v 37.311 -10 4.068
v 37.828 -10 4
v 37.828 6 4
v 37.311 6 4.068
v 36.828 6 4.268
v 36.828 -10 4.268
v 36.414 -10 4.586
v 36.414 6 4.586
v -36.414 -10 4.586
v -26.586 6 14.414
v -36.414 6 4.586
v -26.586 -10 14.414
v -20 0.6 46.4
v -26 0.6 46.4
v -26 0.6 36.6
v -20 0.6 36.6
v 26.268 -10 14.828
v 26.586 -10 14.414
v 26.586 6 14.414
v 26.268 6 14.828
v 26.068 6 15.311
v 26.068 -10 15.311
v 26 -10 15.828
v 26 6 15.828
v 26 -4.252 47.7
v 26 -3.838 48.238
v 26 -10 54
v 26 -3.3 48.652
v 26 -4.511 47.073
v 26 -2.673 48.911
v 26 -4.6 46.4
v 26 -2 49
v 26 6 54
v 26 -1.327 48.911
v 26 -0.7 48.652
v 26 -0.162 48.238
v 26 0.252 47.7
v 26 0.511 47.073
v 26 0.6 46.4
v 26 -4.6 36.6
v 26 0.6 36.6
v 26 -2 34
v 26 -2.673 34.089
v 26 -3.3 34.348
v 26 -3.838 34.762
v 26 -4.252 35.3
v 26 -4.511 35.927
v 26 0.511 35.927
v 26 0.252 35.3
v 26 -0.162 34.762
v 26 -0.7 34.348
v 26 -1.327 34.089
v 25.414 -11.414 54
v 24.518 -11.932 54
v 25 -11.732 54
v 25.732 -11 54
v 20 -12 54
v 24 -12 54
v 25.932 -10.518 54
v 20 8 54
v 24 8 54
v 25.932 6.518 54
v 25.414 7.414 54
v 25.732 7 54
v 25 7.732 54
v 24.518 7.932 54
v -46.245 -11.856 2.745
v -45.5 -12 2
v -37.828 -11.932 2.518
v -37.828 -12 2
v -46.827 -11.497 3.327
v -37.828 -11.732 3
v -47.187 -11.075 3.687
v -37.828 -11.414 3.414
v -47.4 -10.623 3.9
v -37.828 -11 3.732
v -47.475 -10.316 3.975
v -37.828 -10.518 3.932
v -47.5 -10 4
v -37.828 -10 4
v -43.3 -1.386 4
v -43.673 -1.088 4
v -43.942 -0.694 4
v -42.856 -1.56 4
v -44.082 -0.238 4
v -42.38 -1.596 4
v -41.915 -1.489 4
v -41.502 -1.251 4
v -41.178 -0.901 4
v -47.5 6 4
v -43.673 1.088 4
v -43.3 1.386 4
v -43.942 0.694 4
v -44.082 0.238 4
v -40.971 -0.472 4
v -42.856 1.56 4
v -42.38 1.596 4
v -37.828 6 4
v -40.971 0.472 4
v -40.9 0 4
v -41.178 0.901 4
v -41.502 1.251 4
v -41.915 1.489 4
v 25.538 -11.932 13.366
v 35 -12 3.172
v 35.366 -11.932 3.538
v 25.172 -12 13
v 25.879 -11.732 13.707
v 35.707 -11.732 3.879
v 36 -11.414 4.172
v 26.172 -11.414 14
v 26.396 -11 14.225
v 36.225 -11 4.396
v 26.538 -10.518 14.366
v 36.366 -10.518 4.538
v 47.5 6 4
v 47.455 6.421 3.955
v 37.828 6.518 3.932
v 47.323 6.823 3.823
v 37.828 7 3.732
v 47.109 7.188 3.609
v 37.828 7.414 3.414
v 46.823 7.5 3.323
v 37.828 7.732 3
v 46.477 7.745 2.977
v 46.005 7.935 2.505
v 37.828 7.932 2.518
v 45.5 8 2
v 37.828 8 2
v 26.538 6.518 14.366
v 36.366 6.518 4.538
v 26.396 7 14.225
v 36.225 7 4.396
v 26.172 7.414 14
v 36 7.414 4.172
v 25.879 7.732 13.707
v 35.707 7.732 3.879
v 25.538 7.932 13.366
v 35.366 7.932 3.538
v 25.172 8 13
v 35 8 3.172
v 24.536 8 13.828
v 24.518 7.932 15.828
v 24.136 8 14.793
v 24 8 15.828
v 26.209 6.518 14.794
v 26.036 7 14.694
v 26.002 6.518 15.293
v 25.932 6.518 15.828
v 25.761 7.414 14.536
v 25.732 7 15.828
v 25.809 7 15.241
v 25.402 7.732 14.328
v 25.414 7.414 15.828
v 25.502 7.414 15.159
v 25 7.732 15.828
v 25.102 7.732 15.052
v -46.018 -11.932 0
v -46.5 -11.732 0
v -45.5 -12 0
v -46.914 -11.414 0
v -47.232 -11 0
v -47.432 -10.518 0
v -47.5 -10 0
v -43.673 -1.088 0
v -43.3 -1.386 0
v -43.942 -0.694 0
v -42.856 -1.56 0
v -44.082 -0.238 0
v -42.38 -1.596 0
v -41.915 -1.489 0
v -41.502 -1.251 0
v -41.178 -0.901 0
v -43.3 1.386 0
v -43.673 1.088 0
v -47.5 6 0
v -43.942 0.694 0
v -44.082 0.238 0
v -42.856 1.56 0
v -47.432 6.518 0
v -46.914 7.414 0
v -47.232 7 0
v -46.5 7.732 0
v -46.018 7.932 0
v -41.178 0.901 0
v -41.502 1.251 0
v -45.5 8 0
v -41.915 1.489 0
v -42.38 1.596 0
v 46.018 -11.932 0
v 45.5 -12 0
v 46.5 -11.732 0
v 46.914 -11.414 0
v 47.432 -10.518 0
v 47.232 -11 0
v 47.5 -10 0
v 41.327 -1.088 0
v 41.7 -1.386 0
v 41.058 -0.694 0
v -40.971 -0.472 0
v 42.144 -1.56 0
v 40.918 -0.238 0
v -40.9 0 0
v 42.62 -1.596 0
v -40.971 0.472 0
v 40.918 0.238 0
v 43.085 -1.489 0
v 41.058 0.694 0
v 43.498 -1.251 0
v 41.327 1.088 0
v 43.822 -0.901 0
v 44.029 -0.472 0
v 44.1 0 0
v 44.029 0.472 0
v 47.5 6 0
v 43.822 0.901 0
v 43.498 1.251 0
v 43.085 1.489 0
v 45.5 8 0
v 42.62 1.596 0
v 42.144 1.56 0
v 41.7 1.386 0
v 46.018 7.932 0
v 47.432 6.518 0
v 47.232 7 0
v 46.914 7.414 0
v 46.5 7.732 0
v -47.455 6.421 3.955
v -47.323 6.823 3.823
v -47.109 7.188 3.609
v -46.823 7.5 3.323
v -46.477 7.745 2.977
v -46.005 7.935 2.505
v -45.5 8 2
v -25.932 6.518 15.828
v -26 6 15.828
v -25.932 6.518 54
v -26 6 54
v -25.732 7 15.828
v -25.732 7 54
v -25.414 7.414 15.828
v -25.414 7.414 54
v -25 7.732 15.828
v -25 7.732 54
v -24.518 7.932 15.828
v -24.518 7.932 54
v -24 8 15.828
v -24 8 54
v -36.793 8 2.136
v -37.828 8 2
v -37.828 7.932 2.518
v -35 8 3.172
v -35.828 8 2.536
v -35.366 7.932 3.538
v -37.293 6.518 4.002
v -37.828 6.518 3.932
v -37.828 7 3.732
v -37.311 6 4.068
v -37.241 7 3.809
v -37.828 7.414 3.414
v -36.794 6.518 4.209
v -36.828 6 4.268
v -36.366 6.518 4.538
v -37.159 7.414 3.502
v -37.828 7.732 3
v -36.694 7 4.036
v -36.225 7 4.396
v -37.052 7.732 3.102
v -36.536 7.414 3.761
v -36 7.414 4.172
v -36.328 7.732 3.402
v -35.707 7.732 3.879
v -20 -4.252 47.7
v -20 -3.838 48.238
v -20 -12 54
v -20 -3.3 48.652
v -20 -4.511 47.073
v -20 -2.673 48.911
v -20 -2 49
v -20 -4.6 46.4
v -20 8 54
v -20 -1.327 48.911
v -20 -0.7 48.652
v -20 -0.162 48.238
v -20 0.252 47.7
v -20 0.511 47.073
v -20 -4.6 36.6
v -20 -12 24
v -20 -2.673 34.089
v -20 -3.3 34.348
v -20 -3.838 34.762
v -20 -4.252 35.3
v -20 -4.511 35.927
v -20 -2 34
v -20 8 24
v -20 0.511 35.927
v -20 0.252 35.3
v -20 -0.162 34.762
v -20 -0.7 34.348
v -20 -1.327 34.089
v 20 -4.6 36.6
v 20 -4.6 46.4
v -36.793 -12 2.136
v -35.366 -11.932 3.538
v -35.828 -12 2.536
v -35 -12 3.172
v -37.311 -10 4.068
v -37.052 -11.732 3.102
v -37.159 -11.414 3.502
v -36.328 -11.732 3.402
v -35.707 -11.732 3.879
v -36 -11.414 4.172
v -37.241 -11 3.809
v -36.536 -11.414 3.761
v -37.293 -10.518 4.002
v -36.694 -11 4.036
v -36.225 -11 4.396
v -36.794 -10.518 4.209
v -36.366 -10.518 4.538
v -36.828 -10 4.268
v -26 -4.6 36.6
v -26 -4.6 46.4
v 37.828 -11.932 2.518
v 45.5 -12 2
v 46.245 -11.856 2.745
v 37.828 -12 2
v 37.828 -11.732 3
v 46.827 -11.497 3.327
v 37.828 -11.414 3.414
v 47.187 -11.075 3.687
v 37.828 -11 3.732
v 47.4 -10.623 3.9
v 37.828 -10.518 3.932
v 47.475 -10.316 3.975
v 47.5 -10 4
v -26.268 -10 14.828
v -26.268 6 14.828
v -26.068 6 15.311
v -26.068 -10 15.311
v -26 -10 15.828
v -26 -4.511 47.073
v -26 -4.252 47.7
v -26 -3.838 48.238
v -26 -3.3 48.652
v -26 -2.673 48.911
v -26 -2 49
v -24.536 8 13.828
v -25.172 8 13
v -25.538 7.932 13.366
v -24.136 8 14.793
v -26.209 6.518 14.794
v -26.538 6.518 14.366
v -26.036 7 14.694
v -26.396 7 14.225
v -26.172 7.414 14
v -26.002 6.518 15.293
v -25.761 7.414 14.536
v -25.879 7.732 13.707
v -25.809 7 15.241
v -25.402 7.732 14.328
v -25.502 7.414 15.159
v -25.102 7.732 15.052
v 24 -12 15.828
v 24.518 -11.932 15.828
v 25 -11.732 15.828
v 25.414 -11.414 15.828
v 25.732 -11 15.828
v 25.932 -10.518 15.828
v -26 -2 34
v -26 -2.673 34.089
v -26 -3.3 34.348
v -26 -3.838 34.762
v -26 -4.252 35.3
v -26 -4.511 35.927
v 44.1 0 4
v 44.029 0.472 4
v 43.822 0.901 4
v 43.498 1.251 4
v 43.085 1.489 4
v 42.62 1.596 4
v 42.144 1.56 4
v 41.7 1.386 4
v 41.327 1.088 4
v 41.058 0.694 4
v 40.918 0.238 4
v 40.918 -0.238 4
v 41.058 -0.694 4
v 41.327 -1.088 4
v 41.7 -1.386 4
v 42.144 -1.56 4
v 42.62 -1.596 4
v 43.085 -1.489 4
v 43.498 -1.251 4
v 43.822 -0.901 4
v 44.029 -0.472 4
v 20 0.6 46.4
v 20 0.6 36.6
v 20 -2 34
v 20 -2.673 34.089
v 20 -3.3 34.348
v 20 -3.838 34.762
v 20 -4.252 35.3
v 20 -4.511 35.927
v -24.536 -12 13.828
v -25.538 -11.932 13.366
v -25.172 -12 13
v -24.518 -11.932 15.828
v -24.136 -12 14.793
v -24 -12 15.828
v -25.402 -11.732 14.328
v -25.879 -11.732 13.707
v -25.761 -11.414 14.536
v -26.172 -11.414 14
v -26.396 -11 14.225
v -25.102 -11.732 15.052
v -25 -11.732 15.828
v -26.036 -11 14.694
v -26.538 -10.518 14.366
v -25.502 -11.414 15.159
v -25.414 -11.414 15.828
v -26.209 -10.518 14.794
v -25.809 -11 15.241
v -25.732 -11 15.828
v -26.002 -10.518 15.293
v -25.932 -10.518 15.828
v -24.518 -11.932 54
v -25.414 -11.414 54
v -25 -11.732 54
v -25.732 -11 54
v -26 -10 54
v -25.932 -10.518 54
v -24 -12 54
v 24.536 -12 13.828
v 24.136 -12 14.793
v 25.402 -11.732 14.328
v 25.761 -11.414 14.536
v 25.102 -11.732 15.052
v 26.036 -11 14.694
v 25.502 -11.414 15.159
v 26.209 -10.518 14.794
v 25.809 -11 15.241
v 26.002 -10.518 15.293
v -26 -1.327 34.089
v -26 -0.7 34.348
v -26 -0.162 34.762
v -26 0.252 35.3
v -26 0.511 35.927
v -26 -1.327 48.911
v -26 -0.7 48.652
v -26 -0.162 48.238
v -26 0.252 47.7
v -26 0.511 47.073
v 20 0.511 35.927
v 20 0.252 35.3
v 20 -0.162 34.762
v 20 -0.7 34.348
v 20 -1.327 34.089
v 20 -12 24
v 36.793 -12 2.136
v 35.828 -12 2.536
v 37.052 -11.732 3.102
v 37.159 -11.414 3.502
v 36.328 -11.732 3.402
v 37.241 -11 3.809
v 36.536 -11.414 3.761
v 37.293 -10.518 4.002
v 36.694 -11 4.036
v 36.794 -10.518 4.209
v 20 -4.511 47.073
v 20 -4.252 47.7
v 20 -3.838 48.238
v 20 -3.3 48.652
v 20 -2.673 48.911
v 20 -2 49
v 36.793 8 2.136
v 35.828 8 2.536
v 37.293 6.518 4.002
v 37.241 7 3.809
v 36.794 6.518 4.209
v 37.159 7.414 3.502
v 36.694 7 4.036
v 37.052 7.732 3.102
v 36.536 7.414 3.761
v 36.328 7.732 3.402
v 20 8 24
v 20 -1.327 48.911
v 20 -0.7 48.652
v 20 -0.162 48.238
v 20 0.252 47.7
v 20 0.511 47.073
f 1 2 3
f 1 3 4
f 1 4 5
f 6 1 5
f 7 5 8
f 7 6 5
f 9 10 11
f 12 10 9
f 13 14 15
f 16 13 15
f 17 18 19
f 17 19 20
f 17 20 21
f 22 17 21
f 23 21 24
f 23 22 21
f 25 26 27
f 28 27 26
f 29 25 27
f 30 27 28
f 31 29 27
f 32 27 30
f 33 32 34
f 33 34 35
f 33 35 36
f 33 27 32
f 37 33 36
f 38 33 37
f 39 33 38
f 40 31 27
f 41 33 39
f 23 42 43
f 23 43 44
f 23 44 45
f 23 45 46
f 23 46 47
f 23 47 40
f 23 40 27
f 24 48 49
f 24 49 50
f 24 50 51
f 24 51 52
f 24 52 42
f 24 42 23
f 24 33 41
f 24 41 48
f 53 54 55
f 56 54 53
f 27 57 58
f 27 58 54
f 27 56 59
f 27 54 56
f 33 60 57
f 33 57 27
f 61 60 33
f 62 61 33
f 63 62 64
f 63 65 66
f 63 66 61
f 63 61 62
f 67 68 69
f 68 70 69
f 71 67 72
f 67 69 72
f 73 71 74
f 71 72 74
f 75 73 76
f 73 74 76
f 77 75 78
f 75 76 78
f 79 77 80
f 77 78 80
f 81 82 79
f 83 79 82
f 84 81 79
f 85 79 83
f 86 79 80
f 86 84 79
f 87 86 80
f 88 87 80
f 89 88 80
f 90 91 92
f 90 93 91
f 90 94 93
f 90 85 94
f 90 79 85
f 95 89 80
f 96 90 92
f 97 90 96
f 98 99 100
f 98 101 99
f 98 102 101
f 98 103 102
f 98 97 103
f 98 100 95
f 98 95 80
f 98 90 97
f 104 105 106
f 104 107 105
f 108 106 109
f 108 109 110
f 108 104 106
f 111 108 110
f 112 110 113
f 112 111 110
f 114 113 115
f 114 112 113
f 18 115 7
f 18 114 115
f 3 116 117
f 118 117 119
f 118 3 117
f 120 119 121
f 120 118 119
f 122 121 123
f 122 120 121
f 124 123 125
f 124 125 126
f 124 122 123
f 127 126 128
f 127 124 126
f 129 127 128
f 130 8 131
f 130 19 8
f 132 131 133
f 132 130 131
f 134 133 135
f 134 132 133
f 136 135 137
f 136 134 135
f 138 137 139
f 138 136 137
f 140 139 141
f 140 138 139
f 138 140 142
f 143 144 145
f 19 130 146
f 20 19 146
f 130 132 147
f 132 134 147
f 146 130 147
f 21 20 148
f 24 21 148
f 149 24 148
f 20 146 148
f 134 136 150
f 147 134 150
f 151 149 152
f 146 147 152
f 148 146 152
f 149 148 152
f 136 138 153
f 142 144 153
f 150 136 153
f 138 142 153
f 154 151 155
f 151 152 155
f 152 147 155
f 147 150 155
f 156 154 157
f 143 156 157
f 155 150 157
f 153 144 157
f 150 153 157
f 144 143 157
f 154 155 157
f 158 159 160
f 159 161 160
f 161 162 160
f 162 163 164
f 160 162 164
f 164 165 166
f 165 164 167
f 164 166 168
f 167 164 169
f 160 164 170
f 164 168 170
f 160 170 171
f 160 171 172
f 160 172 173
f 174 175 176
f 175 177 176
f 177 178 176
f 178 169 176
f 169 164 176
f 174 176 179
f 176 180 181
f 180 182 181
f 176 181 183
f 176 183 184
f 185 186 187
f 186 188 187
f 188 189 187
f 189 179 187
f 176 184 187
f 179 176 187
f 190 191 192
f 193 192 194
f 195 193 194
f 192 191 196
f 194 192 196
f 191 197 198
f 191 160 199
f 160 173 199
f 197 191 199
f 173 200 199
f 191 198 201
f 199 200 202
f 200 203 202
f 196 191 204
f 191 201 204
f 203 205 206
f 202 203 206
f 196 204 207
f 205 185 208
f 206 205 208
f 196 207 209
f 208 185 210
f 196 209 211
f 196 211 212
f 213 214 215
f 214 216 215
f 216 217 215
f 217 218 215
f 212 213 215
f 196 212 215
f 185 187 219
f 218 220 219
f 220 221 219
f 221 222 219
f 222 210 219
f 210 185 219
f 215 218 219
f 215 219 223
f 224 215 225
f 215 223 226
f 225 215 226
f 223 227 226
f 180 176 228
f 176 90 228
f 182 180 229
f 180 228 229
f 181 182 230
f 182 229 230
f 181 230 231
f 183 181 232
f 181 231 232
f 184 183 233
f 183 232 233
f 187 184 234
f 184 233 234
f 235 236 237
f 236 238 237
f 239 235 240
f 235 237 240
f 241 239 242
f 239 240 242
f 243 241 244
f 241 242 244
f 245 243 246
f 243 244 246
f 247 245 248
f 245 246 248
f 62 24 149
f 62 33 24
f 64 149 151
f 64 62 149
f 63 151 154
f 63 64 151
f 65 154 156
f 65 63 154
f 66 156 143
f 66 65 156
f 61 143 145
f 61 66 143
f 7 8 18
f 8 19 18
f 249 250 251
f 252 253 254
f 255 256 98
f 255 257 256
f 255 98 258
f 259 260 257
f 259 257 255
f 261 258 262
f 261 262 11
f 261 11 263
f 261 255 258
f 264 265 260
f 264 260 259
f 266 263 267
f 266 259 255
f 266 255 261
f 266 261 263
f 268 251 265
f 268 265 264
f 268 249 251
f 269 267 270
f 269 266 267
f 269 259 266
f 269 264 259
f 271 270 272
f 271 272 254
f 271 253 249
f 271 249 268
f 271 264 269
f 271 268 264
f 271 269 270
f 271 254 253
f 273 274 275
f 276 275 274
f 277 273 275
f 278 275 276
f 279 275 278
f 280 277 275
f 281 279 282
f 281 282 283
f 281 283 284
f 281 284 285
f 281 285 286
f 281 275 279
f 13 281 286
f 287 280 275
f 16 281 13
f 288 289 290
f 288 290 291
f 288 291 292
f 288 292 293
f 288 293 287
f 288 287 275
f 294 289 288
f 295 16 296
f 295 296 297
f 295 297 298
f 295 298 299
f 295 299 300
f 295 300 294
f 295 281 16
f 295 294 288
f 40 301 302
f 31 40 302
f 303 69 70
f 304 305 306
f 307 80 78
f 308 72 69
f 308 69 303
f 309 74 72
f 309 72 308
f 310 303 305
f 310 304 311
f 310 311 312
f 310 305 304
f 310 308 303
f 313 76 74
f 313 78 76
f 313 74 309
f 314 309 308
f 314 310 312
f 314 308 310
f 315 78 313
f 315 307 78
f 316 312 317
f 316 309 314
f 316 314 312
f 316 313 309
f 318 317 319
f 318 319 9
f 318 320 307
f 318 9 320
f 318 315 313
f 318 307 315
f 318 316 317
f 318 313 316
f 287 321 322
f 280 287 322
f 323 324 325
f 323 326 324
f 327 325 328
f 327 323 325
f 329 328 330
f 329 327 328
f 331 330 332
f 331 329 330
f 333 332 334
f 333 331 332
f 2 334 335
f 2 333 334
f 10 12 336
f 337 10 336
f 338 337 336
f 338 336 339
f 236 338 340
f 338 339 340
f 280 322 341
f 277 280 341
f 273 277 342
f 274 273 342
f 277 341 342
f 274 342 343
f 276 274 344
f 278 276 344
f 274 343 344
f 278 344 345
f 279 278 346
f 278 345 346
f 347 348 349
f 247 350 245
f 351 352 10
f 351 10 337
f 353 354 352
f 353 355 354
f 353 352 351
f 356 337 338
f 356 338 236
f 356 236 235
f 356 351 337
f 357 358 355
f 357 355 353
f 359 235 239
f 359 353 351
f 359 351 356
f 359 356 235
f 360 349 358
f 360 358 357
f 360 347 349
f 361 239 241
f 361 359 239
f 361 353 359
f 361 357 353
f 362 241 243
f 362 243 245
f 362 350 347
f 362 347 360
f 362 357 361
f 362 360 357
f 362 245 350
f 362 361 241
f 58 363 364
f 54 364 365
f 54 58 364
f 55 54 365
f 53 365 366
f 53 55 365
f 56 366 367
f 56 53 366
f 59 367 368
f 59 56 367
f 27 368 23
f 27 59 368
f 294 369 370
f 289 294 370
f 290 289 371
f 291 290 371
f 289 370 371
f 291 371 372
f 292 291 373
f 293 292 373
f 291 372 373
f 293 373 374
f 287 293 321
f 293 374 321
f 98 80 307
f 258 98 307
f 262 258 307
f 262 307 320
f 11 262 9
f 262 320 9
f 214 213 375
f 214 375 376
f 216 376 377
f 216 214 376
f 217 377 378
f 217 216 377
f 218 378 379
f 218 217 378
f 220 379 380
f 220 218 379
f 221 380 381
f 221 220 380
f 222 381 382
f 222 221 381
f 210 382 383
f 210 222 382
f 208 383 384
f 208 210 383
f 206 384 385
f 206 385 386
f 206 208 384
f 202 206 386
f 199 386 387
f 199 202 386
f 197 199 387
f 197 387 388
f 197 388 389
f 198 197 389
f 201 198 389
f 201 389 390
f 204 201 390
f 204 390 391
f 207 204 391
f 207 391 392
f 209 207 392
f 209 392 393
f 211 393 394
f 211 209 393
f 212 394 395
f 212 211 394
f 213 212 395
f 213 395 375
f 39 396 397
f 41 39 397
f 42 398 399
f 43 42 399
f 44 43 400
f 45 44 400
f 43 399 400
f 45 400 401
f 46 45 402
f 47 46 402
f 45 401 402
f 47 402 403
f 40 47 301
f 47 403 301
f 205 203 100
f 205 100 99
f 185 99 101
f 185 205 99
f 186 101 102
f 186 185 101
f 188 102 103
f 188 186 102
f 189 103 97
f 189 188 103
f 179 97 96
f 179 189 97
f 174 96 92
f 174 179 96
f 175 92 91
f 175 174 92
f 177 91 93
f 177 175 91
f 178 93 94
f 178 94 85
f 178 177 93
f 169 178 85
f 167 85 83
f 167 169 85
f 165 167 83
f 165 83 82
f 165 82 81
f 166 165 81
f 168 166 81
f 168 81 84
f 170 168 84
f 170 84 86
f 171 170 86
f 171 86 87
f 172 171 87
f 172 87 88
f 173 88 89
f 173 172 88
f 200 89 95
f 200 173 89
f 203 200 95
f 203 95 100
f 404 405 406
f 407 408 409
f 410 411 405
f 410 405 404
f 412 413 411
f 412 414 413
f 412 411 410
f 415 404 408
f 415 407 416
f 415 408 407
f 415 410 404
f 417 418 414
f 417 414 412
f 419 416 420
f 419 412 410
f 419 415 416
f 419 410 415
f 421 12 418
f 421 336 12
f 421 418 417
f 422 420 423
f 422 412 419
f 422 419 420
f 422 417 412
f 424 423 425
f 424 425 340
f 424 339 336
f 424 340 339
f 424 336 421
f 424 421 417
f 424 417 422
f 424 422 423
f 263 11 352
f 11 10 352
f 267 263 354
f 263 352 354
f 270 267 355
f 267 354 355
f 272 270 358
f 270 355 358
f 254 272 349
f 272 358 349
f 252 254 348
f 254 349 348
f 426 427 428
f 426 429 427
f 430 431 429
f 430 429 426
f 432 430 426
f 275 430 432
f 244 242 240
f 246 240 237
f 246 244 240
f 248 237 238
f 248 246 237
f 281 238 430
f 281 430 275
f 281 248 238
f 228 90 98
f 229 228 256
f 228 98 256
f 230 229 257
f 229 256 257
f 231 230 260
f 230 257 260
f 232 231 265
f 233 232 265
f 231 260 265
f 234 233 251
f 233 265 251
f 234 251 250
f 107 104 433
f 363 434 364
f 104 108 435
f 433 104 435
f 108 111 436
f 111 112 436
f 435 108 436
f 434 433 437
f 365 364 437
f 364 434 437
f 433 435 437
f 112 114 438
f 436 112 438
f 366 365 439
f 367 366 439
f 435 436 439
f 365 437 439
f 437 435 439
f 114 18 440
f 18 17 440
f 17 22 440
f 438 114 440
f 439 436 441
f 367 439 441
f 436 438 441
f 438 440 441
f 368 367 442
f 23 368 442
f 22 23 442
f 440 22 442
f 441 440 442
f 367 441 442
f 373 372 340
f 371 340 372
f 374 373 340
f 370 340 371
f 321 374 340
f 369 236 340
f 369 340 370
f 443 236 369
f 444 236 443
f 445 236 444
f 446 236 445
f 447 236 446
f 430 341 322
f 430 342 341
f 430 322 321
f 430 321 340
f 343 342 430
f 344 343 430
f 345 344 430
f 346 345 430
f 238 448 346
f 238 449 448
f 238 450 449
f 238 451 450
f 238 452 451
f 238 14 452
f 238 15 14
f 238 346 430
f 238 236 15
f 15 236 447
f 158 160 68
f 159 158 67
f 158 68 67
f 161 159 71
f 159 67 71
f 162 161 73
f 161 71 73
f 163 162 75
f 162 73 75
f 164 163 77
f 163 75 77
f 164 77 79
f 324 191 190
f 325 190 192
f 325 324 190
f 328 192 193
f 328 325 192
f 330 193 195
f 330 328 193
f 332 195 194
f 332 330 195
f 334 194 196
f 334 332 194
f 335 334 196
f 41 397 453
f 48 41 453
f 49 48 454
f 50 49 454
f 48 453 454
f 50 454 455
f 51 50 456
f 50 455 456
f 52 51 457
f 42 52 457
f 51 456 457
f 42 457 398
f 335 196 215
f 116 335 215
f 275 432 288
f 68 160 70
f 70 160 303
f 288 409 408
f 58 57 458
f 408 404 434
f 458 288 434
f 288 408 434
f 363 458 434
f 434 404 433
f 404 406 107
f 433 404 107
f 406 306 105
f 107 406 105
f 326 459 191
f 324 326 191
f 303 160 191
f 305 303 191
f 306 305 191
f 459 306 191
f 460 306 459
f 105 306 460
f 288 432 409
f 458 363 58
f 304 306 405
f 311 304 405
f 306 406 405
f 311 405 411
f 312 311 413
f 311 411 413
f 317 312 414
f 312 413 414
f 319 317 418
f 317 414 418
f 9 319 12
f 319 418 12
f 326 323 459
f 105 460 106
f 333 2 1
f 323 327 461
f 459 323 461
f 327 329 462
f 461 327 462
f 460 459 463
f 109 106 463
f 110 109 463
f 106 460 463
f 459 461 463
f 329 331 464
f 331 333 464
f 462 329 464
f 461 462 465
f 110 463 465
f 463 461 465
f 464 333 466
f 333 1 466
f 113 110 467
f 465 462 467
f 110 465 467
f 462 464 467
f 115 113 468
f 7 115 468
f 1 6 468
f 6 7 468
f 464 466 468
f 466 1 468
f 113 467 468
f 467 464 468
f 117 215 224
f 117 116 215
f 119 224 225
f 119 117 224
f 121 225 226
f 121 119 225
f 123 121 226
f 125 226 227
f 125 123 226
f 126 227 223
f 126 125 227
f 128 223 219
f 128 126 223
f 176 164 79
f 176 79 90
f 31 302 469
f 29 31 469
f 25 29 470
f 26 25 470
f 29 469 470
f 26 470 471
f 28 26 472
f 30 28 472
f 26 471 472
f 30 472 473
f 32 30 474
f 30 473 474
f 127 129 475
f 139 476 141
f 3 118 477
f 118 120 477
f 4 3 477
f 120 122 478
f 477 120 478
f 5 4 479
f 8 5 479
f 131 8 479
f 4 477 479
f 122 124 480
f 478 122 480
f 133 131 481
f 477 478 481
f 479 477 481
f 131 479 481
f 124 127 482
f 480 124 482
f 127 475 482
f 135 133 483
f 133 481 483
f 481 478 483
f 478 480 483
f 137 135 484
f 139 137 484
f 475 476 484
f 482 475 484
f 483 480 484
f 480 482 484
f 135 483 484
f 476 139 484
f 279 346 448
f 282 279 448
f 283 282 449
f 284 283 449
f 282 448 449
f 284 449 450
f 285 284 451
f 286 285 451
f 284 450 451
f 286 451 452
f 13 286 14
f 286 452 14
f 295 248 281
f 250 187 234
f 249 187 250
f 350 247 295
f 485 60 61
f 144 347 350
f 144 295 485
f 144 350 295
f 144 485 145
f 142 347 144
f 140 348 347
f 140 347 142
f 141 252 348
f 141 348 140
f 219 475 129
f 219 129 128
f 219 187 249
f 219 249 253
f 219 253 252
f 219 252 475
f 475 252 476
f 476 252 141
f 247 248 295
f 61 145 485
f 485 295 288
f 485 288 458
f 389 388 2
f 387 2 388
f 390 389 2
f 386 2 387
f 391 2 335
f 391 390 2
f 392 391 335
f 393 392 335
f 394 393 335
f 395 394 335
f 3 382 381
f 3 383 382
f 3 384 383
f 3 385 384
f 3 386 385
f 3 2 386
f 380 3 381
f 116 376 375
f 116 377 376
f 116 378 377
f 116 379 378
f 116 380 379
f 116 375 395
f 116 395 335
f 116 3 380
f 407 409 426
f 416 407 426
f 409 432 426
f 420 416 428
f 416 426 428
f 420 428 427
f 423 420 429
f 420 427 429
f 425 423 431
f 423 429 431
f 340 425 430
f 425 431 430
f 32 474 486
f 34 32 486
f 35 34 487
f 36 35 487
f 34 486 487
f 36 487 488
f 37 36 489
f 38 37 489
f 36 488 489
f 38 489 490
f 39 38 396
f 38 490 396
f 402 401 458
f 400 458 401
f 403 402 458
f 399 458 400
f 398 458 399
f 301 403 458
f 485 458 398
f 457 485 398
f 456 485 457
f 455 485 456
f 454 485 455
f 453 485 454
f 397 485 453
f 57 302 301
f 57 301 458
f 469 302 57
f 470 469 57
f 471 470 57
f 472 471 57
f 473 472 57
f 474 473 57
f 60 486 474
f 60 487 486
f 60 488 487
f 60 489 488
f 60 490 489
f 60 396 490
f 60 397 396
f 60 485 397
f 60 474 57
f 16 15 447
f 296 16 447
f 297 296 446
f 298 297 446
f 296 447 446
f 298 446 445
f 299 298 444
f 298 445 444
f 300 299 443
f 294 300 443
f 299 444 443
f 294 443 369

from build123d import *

# Parameters (mm, degrees)
F0_W     = 95
F0_H     = 20
F0_R     = 1.6
F1_DEPTH = 4
F3_DEPTH = 20
F4_SIZE  = 11
F6_DEPTH = 52
F7_F1_R  = 2
F7_F2_R  = 2


with BuildPart() as f1:
    # F0 (on Top) → F1 (new body)
    with BuildSketch(Plane.XY):
        with Locations((0, -2)):
            Rectangle(F0_W, F0_H)
        with Locations((-42.5, 0)):
            Circle(F0_R, mode=Mode.SUBTRACT)
        with Locations((42.5, 0)):
            Circle(F0_R, mode=Mode.SUBTRACT)
    extrude(amount=F1_DEPTH)

    # F2 (on face) → F3 (join, through all)
    with BuildSketch(Plane(origin=(0, 8, 0), x_dir=(-1, 0, 0), z_dir=(0, 1, 0))):
        Polygon((-26, 54), (-26, 4), (26, 4), (26, 54), (20, 54), (20, 24), (-20, 24), (-20, 54), align=None)
    extrude(amount=-F3_DEPTH)

    # F4
    f4_edges = [f1.edges().sort_by_distance(p)[0] for p in [
        (26, -2, 4),
        (-26, -2, 4),
    ]]
    chamfer(f4_edges, length=F4_SIZE)

    # F5 (on face) → F6 (cut, through all)
    with BuildSketch(Plane(origin=(-26, 0, 0), x_dir=(0, -1, 0), z_dir=(-1, 0, 0))):
        with BuildLine():
            ThreePointArc((2, 49), (0.1615223689, 48.2384776311), (-0.6, 46.4))
            Line((-0.6, 46.4), (-0.6, 36.6))
            ThreePointArc((-0.6, 36.6), (0.1615223689, 34.7615223689), (2, 34))
            ThreePointArc((2, 34), (3.8384776311, 34.7615223689), (4.6, 36.6))
            Line((4.6, 36.6), (4.6, 46.4))
            ThreePointArc((4.6, 46.4), (3.8384776311, 48.2384776311), (2, 49))
        make_face()
    extrude(amount=-F6_DEPTH, mode=Mode.SUBTRACT)

    # F7: fillet of radius 2 on 12 edges, made by hand

    # F7_f1
    f7_f1_edges = [f1.edges().sort_by_distance(p)[0] for p in [
        (37, -2, 4),
        (26, -2, 15),
        (-37, -2, 4),
        (-26, -2, 15),
    ]]
    fillet(f7_f1_edges, radius=F7_F1_R)

    # F7_f2
    f7_f2_edges = [f1.edges().sort_by_distance(p)[0] for p in [
        (31.5, 8, 9.5),
        (31.5, -12, 9.5),
        (-31.5, 8, 9.5),
        (-31.5, -12, 9.5),
        (-47.5, -12, 2),
        (-47.5, 8, 2),
        (47.5, -12, 2),
        (47.5, 8, 2),
        (-37.06306026, -12, 4.152240935),
        (-26.152240935, -12, 15.06306026),
        (-37.06306026, 8, 4.152240935),
        (-26.152240935, 8, 15.06306026),
        (37.06306026, -12, 4.152240935),
        (26.152240935, -12, 15.06306026),
        (37.06306026, 8, 4.152240935),
        (26.152240935, 8, 15.06306026),
    ]]
    fillet(f7_f2_edges, radius=F7_F2_R)


solid = f1.part
